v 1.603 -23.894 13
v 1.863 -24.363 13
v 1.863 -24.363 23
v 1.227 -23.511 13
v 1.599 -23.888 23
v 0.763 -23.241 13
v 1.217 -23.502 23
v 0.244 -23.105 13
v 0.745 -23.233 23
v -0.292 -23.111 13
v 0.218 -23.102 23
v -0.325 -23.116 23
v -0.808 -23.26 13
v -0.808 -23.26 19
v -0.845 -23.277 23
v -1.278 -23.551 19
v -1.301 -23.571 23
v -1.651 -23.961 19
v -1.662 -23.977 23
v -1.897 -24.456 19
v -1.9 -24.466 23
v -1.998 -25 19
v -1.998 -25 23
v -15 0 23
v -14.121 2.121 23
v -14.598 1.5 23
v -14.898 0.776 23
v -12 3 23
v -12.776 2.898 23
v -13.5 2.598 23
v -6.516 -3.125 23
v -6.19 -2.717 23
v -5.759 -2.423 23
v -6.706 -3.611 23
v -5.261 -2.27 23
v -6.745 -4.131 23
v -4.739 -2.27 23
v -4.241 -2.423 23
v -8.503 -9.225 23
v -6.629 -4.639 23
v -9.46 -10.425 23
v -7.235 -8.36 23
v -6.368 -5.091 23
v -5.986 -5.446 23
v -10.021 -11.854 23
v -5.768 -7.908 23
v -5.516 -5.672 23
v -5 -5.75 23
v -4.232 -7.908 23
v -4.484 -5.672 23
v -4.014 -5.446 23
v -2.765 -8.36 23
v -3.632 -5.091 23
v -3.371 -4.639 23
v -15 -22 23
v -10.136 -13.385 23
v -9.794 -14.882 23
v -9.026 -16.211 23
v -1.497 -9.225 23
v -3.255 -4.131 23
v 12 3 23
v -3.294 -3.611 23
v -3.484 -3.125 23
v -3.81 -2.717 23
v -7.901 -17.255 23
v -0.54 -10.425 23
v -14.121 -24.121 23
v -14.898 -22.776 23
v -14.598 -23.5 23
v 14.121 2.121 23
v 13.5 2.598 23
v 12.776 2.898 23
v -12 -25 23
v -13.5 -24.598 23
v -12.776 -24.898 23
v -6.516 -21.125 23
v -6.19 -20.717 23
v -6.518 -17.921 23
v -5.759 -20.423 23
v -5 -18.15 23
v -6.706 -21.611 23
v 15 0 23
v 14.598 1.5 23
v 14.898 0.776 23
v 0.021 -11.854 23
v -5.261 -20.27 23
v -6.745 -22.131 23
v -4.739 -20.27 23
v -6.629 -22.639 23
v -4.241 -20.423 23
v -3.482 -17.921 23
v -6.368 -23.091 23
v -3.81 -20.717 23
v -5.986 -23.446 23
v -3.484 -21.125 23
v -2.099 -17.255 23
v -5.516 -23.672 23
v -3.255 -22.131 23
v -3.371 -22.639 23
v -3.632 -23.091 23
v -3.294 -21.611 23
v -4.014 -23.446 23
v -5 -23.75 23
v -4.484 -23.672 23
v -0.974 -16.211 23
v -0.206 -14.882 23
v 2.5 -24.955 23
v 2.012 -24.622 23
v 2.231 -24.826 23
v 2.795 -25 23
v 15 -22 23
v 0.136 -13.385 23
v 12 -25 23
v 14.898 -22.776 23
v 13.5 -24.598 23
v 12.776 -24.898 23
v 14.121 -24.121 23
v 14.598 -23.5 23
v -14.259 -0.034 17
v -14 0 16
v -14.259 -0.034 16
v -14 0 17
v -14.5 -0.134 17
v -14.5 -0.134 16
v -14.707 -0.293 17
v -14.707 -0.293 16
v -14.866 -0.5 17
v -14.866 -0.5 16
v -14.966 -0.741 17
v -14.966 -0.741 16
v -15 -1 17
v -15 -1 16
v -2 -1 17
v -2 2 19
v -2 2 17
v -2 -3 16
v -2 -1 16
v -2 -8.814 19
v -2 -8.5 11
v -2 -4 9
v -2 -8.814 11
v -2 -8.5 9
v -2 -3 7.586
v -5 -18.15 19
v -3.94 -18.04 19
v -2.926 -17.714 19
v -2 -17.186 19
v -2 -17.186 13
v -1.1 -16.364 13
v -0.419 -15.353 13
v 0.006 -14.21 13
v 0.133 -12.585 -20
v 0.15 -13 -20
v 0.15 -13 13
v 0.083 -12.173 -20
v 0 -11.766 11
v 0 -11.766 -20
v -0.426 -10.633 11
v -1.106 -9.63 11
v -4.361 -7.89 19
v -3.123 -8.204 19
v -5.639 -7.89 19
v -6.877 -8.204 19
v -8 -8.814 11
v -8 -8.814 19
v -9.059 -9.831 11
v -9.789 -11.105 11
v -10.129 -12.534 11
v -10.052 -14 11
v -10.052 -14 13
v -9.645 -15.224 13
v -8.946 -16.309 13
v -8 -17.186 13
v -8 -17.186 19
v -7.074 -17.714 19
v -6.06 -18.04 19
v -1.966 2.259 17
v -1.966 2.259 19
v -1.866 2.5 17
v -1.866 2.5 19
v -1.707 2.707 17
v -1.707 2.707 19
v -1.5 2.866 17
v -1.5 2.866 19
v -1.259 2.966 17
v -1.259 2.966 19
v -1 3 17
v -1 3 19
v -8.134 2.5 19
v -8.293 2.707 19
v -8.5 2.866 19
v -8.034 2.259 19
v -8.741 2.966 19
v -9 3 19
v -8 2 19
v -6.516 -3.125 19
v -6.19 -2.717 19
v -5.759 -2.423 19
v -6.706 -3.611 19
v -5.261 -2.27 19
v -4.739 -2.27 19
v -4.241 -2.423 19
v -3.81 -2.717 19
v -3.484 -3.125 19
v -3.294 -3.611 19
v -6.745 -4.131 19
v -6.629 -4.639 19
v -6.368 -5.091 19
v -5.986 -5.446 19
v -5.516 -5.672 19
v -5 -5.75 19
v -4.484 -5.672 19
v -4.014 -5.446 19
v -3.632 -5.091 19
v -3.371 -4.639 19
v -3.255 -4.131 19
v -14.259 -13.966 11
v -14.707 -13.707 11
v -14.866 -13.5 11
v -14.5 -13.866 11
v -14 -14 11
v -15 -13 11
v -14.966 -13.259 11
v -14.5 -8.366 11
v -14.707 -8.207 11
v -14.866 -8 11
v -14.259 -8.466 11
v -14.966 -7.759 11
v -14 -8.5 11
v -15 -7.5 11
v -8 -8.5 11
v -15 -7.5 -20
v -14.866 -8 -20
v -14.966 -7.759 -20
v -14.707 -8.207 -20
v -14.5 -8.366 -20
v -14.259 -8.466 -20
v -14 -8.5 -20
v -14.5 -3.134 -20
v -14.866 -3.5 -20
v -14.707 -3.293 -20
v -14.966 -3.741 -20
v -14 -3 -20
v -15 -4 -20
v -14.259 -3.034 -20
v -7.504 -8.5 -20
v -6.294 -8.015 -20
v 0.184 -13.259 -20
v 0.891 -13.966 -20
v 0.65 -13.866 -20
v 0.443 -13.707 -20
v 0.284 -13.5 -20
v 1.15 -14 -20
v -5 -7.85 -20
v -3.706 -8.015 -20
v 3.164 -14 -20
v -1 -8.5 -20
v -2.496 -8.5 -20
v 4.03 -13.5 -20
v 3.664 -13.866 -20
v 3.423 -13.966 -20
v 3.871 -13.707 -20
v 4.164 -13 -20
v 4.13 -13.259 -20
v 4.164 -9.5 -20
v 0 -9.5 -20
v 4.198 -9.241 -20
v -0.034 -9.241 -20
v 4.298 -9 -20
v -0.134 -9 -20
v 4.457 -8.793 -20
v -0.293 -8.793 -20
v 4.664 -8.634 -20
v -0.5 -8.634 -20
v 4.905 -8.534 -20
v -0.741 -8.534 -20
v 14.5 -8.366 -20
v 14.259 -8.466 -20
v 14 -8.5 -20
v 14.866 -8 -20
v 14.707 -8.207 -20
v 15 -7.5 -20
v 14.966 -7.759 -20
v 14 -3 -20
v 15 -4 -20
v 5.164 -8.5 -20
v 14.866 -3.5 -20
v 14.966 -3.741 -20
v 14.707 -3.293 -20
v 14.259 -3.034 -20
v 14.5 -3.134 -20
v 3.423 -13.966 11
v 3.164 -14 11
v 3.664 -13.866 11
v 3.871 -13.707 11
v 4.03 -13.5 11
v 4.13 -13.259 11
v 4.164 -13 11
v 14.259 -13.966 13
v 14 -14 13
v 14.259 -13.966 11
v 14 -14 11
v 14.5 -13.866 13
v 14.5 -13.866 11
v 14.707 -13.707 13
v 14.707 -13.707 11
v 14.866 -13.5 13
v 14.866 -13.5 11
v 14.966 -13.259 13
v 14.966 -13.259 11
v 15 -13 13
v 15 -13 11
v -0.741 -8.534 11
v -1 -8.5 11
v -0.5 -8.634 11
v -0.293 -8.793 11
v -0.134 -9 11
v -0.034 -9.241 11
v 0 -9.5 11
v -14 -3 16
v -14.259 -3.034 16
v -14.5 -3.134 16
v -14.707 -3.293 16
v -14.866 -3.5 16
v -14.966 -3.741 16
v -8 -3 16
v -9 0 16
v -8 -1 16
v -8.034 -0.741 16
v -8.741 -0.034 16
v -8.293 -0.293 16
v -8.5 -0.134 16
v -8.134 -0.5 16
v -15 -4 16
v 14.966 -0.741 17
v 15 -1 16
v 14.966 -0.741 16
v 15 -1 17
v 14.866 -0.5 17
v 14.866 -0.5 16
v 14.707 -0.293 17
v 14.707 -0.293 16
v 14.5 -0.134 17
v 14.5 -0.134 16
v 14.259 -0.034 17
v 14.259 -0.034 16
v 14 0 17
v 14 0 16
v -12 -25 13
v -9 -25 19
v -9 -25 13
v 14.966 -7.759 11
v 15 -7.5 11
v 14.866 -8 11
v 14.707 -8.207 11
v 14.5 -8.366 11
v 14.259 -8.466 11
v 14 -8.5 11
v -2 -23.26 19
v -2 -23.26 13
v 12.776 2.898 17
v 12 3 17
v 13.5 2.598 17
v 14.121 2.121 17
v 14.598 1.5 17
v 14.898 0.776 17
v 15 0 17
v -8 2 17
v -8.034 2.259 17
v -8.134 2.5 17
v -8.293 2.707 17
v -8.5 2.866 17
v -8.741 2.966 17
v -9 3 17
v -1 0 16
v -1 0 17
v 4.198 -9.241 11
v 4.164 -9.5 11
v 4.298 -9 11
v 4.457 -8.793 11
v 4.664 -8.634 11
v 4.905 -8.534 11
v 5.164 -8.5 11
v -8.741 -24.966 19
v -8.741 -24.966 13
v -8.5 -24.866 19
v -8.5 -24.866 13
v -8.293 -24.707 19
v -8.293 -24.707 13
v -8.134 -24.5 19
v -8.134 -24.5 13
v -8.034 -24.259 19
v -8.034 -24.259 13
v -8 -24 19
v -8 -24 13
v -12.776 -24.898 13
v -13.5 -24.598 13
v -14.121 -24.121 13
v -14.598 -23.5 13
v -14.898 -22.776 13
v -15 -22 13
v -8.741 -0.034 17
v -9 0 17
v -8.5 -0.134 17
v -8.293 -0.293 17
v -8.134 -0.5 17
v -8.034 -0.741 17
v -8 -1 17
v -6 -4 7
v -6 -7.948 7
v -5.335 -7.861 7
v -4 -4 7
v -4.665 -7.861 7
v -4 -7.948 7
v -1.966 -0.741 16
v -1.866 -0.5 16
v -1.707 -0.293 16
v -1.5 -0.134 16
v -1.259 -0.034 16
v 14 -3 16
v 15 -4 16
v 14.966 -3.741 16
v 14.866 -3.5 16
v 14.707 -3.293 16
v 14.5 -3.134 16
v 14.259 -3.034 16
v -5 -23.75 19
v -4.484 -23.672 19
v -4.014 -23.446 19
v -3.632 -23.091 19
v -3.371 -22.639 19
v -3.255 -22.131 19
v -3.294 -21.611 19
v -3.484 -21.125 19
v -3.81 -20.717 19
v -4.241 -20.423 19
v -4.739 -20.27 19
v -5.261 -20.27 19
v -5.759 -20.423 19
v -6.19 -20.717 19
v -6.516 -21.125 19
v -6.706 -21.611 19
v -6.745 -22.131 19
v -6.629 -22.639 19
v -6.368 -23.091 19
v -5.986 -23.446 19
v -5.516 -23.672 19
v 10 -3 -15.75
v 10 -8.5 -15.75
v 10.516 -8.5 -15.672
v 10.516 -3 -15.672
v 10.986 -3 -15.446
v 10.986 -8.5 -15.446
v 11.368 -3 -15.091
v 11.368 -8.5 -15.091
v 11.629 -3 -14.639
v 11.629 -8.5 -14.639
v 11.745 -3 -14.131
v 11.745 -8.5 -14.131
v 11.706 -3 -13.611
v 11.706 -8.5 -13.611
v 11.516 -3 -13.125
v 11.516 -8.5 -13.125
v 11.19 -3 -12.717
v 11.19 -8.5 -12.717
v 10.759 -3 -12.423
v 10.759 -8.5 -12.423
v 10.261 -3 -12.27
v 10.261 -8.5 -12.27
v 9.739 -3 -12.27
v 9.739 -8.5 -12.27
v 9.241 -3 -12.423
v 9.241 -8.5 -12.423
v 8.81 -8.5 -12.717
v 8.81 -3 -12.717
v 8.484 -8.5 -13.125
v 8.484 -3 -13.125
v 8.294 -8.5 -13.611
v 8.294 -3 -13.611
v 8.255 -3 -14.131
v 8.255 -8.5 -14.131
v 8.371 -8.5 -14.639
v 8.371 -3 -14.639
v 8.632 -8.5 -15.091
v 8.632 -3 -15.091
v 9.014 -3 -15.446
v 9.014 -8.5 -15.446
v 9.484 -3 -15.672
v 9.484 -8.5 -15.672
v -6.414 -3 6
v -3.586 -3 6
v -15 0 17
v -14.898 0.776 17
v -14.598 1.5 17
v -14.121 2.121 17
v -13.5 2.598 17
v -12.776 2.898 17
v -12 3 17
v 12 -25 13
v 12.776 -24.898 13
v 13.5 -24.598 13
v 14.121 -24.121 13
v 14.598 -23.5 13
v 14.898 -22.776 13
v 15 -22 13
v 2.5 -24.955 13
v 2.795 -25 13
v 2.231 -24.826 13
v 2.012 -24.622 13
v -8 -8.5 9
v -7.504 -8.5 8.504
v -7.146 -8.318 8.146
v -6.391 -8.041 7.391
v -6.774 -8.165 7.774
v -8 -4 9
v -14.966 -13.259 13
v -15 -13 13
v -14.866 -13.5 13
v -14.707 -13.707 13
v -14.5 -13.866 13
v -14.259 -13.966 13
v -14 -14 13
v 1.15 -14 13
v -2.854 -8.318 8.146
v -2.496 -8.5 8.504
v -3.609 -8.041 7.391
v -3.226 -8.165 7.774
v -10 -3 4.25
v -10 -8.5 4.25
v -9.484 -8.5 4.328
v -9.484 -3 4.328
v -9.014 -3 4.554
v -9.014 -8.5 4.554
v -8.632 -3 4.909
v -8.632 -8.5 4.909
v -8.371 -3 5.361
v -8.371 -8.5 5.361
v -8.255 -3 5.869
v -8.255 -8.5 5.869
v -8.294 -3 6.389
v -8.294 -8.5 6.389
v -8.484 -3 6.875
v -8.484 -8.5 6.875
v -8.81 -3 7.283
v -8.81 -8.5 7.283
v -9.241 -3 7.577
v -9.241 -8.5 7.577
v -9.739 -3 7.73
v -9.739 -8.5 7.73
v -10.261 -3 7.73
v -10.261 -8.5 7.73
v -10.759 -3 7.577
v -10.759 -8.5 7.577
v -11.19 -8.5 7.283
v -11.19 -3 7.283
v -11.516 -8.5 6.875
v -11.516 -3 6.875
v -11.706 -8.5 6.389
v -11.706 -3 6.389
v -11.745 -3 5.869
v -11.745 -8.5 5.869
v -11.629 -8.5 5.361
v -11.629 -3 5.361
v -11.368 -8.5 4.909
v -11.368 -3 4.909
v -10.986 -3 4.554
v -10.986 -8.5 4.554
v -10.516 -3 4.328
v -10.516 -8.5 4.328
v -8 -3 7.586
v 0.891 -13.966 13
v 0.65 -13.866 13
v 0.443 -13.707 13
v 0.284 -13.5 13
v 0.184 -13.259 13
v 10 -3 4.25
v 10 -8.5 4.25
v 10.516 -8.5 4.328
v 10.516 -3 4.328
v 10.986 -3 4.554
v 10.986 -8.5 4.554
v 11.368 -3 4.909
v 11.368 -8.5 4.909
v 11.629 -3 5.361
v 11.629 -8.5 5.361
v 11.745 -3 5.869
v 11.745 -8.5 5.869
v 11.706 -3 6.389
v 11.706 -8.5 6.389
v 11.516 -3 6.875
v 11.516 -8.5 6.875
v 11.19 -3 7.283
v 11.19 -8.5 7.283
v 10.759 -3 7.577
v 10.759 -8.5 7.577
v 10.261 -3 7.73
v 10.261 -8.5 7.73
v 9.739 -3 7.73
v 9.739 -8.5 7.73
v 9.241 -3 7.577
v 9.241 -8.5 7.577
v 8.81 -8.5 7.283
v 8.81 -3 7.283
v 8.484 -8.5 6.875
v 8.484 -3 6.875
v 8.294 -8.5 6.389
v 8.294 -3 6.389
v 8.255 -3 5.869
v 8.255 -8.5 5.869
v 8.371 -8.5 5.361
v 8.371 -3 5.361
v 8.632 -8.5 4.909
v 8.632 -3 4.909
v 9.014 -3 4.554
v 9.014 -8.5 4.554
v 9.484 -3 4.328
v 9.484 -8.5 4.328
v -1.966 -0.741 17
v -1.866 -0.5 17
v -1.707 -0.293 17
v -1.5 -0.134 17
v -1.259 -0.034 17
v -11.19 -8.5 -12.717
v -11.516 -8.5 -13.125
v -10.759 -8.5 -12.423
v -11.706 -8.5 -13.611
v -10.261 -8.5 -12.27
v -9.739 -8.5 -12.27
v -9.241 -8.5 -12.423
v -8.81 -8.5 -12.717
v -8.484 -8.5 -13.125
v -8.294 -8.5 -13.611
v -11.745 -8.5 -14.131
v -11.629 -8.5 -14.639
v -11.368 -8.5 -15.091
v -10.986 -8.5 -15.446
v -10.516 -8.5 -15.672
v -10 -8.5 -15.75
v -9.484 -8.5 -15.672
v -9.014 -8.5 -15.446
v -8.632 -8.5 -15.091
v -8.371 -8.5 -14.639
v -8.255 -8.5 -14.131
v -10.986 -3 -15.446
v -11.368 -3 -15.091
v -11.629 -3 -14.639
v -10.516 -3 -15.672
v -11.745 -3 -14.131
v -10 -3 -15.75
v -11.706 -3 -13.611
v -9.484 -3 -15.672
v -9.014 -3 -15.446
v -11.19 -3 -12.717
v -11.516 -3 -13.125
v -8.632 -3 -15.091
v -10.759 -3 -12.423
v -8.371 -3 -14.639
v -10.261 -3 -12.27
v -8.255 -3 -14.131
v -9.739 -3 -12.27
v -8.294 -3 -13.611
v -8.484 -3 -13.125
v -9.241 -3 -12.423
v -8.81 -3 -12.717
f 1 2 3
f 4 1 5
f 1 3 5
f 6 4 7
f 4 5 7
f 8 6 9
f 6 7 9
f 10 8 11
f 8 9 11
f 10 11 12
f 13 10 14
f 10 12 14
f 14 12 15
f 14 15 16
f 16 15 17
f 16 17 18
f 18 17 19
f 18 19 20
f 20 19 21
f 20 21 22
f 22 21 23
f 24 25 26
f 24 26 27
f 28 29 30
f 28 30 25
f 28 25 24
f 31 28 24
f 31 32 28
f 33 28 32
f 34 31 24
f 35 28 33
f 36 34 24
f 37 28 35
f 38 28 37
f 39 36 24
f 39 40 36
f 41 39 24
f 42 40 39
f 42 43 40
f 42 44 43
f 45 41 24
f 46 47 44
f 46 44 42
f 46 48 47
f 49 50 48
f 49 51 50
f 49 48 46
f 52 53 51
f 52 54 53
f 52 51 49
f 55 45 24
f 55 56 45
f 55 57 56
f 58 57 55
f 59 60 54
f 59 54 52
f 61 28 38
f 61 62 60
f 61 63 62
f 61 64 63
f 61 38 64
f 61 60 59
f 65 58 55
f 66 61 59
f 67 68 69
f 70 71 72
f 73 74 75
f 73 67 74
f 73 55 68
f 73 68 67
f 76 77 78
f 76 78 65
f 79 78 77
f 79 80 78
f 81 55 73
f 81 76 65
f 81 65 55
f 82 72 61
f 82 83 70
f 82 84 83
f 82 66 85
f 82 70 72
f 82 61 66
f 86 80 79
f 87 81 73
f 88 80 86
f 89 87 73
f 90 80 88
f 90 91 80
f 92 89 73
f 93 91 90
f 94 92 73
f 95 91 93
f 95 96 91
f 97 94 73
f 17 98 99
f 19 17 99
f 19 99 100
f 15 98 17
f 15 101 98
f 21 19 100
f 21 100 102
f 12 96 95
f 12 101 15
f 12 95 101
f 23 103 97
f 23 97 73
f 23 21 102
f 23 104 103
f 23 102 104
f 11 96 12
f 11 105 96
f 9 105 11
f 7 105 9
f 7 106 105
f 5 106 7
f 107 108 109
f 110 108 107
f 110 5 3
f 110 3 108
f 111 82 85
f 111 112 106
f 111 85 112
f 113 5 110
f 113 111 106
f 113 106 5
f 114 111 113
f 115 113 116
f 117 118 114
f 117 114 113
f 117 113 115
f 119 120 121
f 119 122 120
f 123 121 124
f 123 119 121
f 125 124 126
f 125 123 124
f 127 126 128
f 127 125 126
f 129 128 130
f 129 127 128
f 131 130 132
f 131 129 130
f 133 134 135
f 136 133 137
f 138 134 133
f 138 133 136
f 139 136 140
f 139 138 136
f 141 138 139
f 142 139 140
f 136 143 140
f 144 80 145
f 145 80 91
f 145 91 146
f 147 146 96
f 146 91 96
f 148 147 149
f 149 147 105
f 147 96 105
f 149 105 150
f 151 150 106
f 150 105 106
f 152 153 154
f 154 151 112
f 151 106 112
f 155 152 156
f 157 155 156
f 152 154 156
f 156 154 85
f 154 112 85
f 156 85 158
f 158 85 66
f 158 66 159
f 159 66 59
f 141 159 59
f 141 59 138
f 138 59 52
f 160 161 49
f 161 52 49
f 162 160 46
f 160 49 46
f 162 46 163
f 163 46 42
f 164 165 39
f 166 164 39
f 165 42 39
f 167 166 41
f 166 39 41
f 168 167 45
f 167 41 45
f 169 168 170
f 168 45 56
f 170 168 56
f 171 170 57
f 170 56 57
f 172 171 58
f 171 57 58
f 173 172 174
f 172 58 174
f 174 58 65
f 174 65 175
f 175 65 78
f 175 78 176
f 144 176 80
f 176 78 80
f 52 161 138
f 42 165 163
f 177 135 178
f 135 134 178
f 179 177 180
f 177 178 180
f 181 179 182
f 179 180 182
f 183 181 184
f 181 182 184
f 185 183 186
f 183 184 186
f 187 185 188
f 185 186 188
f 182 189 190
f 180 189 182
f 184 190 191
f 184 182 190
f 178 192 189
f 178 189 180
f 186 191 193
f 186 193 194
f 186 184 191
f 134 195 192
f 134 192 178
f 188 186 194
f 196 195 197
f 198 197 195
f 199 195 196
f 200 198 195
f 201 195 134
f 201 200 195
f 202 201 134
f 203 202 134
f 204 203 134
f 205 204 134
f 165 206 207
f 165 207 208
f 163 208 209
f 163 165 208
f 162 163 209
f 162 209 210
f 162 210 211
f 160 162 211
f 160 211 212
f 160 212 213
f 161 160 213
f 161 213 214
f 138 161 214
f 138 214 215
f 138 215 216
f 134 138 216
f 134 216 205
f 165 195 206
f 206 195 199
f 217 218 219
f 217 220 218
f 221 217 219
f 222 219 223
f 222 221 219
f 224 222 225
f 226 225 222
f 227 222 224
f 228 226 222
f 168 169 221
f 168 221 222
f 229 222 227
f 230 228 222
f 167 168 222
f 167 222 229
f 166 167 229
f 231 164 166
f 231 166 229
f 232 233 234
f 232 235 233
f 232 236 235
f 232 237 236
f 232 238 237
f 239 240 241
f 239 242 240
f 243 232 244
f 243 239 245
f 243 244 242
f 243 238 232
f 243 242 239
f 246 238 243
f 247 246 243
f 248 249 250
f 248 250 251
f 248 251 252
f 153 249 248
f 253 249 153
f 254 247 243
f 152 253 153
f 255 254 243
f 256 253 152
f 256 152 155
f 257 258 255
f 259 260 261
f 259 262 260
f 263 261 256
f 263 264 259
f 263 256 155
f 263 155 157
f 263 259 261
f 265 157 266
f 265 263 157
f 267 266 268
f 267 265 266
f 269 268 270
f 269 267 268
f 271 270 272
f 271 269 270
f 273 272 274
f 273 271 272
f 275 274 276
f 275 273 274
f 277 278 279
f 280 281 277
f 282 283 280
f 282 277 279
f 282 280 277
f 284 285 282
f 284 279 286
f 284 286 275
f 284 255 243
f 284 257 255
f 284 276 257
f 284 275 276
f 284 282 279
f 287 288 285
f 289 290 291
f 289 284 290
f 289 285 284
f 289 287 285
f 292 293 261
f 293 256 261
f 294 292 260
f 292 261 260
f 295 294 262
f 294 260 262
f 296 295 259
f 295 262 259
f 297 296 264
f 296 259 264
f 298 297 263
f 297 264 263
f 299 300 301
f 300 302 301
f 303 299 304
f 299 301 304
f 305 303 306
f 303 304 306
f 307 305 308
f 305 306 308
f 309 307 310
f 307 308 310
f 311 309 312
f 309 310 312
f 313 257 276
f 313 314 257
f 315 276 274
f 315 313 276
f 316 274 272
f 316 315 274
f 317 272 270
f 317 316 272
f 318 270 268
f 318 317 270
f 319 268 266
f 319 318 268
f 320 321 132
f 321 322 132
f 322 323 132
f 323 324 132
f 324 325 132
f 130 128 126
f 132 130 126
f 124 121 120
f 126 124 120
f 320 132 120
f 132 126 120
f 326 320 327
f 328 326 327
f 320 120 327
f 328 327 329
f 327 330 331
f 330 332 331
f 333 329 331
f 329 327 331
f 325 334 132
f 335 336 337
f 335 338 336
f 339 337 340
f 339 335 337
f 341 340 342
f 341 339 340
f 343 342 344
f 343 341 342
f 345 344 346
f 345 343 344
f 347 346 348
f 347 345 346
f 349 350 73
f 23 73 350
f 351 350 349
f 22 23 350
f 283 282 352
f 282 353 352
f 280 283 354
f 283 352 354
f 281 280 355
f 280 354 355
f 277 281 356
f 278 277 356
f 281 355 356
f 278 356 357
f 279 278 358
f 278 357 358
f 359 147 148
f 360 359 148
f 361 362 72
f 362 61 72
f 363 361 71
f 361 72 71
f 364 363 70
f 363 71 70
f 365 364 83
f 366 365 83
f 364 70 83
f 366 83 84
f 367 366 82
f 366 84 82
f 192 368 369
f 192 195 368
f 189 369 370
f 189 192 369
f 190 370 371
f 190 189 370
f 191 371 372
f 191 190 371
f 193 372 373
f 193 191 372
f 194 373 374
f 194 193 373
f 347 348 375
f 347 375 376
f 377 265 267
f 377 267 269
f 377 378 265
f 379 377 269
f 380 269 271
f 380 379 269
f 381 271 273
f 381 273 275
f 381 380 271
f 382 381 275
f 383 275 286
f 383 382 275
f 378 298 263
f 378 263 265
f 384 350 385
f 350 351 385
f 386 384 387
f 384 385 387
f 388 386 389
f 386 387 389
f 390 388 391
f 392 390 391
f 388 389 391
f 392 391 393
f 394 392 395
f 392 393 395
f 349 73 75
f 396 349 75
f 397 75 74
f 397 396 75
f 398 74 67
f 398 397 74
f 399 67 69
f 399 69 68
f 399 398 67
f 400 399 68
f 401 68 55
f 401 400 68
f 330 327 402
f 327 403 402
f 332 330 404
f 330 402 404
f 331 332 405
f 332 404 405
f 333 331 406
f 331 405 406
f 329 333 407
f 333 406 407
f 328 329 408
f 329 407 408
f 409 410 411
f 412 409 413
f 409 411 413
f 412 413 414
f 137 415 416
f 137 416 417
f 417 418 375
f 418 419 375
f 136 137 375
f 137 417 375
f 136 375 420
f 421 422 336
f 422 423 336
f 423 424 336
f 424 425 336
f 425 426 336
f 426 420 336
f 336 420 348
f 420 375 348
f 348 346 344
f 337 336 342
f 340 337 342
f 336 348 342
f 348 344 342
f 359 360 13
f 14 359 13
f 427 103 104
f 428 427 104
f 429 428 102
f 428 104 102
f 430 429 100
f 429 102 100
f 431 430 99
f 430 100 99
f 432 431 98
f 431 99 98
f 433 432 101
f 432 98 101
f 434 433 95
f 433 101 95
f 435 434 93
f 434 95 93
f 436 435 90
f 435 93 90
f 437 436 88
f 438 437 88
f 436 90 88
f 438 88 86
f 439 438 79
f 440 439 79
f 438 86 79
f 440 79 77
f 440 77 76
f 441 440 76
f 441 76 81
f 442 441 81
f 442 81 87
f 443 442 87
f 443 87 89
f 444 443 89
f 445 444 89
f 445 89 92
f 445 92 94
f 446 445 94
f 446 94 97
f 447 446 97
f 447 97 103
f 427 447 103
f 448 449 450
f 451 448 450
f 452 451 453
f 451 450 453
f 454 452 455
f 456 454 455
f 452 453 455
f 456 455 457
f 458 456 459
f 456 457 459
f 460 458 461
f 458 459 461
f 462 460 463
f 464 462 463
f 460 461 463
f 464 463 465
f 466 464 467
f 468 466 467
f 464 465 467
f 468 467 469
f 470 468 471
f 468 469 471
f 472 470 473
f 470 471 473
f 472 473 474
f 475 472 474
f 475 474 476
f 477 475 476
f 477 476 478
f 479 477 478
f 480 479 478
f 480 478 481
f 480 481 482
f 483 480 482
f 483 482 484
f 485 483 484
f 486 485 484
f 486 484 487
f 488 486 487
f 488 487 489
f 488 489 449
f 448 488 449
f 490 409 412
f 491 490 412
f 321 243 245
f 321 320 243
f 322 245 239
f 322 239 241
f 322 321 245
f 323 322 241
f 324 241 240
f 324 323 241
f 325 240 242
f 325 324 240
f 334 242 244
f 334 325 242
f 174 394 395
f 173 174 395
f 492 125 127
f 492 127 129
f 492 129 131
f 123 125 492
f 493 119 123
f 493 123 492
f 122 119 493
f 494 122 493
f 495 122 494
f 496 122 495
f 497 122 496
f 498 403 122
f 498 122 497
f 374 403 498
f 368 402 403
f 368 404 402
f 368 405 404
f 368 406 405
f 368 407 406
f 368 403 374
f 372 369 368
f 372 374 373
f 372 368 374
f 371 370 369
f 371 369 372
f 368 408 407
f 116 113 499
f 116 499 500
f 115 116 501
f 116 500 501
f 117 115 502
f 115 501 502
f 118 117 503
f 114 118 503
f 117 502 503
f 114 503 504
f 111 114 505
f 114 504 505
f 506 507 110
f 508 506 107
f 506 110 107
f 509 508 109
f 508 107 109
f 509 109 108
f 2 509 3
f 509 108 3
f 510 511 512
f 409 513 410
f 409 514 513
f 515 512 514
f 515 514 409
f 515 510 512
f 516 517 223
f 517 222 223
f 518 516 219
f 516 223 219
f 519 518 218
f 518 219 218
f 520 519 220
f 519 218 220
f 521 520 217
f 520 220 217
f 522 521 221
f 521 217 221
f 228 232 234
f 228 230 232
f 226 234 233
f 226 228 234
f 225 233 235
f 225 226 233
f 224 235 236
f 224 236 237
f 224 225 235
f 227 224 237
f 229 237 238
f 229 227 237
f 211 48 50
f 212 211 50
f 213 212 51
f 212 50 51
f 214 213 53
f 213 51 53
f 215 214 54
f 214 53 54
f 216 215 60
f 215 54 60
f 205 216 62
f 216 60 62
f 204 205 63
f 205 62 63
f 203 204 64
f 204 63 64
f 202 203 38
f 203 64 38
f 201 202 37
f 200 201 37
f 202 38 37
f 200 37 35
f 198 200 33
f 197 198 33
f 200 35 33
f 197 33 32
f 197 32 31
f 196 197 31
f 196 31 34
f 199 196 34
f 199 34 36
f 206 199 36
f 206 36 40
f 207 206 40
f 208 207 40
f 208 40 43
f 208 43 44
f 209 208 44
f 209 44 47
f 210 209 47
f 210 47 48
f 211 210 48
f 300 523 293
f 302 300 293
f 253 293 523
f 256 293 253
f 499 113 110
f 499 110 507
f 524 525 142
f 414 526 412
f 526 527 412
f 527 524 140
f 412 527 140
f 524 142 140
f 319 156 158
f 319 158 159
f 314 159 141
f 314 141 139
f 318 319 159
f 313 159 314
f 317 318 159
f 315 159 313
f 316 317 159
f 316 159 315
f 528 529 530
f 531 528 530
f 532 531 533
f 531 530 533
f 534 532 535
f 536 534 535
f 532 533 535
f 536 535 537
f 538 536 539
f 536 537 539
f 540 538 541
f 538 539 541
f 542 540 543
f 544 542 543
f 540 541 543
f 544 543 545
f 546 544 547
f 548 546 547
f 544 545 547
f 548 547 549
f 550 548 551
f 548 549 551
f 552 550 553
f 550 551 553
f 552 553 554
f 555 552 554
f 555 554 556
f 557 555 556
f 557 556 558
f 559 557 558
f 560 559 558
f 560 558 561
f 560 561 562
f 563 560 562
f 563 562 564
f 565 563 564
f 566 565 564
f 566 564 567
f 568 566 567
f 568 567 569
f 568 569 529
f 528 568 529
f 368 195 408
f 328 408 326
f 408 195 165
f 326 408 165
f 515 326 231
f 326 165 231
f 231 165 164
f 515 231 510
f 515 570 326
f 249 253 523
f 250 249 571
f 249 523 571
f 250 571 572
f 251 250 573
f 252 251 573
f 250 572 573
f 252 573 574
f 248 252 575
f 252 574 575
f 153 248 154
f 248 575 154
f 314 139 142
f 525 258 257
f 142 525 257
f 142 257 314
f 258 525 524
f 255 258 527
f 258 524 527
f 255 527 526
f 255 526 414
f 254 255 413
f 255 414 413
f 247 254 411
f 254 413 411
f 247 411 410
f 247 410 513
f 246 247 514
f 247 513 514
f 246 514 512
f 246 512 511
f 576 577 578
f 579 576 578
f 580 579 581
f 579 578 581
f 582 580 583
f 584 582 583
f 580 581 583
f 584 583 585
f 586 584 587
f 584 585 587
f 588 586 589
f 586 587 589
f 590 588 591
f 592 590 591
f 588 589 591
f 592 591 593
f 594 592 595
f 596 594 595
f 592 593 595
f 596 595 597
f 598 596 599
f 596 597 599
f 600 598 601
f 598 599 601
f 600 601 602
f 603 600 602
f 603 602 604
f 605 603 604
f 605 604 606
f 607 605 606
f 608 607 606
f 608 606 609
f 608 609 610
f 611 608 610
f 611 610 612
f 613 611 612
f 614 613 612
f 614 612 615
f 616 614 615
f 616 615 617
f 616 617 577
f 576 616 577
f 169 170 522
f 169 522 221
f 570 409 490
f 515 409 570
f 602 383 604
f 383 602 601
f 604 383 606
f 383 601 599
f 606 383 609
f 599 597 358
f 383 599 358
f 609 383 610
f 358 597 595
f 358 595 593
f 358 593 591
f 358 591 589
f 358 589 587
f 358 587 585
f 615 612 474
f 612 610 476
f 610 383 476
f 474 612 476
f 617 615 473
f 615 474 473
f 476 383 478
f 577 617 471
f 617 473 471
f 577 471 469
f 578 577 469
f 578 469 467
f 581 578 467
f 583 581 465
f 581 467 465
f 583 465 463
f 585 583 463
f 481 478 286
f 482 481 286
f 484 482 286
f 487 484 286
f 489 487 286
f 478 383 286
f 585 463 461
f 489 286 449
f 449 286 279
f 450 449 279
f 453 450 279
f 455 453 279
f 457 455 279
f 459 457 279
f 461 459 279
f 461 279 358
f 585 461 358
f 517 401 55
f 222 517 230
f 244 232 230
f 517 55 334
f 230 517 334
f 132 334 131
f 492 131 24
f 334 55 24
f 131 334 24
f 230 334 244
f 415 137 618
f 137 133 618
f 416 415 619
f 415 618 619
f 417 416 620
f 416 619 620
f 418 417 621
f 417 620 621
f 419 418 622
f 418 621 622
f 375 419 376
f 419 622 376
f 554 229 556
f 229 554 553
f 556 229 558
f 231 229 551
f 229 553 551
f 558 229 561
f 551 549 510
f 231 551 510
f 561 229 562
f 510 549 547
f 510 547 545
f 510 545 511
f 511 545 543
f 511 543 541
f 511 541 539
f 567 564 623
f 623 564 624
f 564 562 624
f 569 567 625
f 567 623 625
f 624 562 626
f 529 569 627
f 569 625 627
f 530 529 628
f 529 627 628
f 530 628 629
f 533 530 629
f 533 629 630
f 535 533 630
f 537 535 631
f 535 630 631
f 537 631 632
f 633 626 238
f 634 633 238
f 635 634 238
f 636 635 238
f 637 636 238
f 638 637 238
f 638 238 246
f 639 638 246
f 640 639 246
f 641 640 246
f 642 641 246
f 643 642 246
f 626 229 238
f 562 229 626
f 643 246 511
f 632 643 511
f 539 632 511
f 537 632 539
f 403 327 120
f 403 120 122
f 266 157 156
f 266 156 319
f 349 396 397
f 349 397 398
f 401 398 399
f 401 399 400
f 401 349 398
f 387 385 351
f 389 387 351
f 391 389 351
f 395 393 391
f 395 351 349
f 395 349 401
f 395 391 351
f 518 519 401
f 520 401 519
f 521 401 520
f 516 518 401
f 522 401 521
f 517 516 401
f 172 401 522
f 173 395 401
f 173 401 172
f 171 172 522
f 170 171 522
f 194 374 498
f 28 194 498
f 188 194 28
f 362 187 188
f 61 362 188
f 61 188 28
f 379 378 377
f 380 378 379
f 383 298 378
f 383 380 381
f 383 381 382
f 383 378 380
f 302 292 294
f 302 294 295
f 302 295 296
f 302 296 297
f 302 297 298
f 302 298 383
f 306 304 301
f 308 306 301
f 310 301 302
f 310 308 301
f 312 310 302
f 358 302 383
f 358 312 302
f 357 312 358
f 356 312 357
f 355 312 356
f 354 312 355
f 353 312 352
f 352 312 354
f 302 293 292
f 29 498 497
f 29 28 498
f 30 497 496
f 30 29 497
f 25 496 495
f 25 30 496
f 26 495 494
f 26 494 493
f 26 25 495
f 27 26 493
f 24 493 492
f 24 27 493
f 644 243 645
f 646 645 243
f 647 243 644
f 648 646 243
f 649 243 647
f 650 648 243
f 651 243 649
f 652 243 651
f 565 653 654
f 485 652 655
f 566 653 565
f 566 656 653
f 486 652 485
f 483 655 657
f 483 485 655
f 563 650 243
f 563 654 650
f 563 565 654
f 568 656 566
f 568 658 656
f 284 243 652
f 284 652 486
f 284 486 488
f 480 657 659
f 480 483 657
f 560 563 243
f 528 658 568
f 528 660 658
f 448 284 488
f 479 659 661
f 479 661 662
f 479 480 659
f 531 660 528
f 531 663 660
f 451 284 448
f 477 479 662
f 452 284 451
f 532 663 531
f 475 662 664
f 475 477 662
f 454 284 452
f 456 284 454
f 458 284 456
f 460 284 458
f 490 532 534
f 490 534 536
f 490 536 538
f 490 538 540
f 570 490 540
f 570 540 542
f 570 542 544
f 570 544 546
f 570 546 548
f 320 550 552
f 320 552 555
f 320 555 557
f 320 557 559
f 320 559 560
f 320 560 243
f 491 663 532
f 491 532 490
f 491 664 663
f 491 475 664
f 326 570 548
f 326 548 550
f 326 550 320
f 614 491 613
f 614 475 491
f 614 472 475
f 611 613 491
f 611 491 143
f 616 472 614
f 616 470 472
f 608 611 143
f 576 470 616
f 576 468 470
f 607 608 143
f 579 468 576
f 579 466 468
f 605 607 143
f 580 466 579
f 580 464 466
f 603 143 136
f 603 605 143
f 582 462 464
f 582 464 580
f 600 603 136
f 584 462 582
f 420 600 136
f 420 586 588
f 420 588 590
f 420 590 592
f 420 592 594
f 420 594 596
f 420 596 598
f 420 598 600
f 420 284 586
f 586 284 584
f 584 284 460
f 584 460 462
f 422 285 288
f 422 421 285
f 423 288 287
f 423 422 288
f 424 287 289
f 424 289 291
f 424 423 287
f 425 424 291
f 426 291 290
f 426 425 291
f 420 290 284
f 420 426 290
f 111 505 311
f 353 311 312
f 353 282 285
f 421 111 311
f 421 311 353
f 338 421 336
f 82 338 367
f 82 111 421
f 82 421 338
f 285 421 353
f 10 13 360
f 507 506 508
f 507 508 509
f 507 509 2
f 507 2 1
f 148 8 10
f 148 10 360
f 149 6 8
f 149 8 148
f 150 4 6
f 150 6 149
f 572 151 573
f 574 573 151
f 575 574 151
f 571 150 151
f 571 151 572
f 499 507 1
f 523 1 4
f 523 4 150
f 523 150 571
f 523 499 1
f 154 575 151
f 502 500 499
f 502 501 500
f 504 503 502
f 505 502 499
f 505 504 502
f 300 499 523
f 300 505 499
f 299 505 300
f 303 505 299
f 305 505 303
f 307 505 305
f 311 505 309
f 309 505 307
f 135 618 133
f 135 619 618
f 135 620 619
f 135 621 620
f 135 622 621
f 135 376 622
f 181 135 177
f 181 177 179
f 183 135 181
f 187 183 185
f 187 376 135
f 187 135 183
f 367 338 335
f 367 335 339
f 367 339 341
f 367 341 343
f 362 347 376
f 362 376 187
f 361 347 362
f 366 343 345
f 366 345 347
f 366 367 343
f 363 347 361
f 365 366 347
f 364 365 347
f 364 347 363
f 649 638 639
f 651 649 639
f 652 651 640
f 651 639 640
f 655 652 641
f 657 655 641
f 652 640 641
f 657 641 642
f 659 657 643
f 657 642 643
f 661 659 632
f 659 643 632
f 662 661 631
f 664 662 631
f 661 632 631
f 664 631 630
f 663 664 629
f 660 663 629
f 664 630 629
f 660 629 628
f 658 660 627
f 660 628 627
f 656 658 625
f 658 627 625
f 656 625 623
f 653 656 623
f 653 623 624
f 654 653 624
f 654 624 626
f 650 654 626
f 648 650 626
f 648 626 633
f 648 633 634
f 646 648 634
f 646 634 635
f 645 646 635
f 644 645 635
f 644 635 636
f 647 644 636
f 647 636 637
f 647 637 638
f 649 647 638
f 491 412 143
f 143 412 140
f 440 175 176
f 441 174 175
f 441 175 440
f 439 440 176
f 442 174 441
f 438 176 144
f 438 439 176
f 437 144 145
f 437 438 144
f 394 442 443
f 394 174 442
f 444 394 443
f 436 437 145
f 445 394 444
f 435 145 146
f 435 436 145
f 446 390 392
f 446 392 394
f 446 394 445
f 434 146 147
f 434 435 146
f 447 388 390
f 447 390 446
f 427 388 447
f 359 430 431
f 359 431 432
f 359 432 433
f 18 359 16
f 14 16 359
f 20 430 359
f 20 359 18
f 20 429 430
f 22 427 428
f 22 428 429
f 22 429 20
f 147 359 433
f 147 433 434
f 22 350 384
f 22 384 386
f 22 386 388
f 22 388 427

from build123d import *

# Parameters (mm, degrees)
PAD001_DEPTH      = 15
PAD001_DEPTH_BACK = 15
SKETCH014_W       = 12
SKETCH014_H       = 6
POCKET_DEPTH      = 28.001
SKETCH013_R       = 1.75
POCKET001_DEPTH   = 21
SKETCH012_R       = 5.15
POCKET002_DEPTH   = 43.001
SKETCH007_R       = 1.75
POCKET003_DEPTH   = 17.001
SKETCH008_W       = 6.407674
SKETCH008_H       = 16
SKETCH008_W_2     = 6.93002
SKETCH008_H_2     = 13.41794
POCKET004_DEPTH   = 31
SKETCH018_R       = 2
POCKET005_DEPTH   = 55.001
SKETCH020_W       = 2.261289
SKETCH020_H       = 2.342064
POCKET006_DEPTH   = 6
SKETCH015_W       = 50.47
SKETCH015_H       = 40
POCKET007_DEPTH   = 3
CHAMFER_SIZE      = 2
CHAMFER001_SIZE   = 2
CHAMFER002_SIZE   = 1
FILLET_R          = 3
FILLET001_R       = 1
FILLET002_R       = 1
FILLET003_R       = 1
FILLET004_R       = 1
FILLET005_R       = 1
FILLET006_R       = 1
FILLET007_R       = 1
FILLET008_R       = 1
FILLET009_R       = 1
FILLET010_R       = 1
FILLET011_R       = 1
FILLET012_R       = 1
FILLET013_R       = 1


with BuildPart() as part:
    # Sketch005 → Pad001 (new body, two sides)
    with BuildSketch(Plane.YZ) as pad001_sk:
        Polygon((0, -20), (0, 17), (3, 17), (3, 23), (-25, 23), (-25, 13), (-14, 13), (-14, -20), align=None)
    extrude(amount=PAD001_DEPTH)
    extrude(pad001_sk.sketch, amount=-PAD001_DEPTH_BACK)

    # Sketch014 (on Face5 of Pad001) → Pocket (cut, through all)
    with BuildSketch(Plane(origin=(0, -25, 0), x_dir=(0, 0, -1), z_dir=(0, -1, 0))):
        with Locations((-13, -5)):
            Rectangle(SKETCH014_W, SKETCH014_H)
    extrude(amount=-POCKET_DEPTH, mode=Mode.SUBTRACT)

    # Sketch013 → Pocket001 (cut)
    with BuildSketch(Plane(origin=(0, 0, 35), x_dir=(0, -1, 0), z_dir=(0, 0, 1))):
        with Locations((4, -5)):
            Circle(SKETCH013_R)
        with Locations((22, -5)):
            Circle(SKETCH013_R)
    extrude(amount=-POCKET001_DEPTH, mode=Mode.SUBTRACT)

    # Sketch012 (on Face4 of Pad001) → Pocket002 (cut, through all)
    with BuildSketch(Plane(origin=(0, 0, 23), x_dir=(0, -1, 0), z_dir=(0, 0, 1))):
        with Locations((13, -5)):
            Circle(SKETCH012_R)
    extrude(amount=-POCKET002_DEPTH, mode=Mode.SUBTRACT)

    # Sketch007 → Pocket003 (cut, through all)
    with BuildSketch(Plane(origin=(0, -14, 0), x_dir=(0, 0, -1), z_dir=(0, -1, 0))):
        with Locations((-6, 10)):
            Circle(SKETCH007_R)
        with Locations((14, 10)):
            Circle(SKETCH007_R)
        with Locations((-6, -10)):
            Circle(SKETCH007_R)
        with Locations((14, -10)):
            Circle(SKETCH007_R)
    extrude(amount=-POCKET003_DEPTH, mode=Mode.SUBTRACT)

    # Sketch008 → Pocket004 (cut)
    with BuildSketch(Plane.YX.offset(20)):
        with Locations((-11.703837, -8)):
            Rectangle(SKETCH008_W, SKETCH008_H)
        with Locations((-11.96501, 10.872729)):
            Rectangle(SKETCH008_W_2, SKETCH008_H_2)
    extrude(amount=-POCKET004_DEPTH, mode=Mode.SUBTRACT)

    # Sketch018 → Pocket005 (cut, through all)
    with BuildSketch(Plane(origin=(0, 0, 35), x_dir=(0, -1, 0), z_dir=(0, 0, 1))):
        with Locations((25.089622, 0)):
            Circle(SKETCH018_R)
    extrude(amount=-POCKET005_DEPTH, mode=Mode.SUBTRACT)

    # Sketch020 (on Face29 of Pocket005) → Pocket006 (cut)
    with BuildSketch(Plane.YX.offset(-13)):
        with Locations((-24.390742, -1.171032)):
            Rectangle(SKETCH020_W, SKETCH020_H)
    extrude(amount=-POCKET006_DEPTH, mode=Mode.SUBTRACT)

    # Sketch015 → Pocket007 (cut)
    with BuildSketch(Plane.ZX):
        with Locations((-9.235, 0)):
            Rectangle(SKETCH015_W, SKETCH015_H)
    extrude(amount=-POCKET007_DEPTH, mode=Mode.SUBTRACT)

    # Chamfer
    chamfer_edges = [part.edges().sort_by_distance(p)[0] for p in [
        (-8, -5.75, 7),
    ]]
    chamfer(chamfer_edges, length=CHAMFER_SIZE)

    # Chamfer001
    chamfer001_edges = [part.edges().sort_by_distance(p)[0] for p in [
        (-2, -5.75, 7),
    ]]
    chamfer(chamfer001_edges, length=CHAMFER001_SIZE)

    # Chamfer002
    chamfer002_edges = [part.edges().sort_by_distance(p)[0] for p in [
        (-3, -3, 8),
        (-5, -3, 7),
        (-7, -3, 8),
    ]]
    chamfer(chamfer002_edges, length=CHAMFER002_SIZE)

    # Fillet
    fillet_edges = [part.edges().sort_by_distance(p)[0] for p in [
        (-15, -25, 18),
        (15, -25, 18),
        (-15, 3, 20),
        (15, 3, 20),
    ]]
    fillet(fillet_edges, radius=FILLET_R)

    # Fillet001
    fillet001_edges = [part.edges().sort_by_distance(p)[0] for p in [
        (-15, -8.5, -4.5),
        (4.163759, -14, -4.5),
    ]]
    fillet(fillet001_edges, radius=FILLET001_R)

    # Fillet002
    fillet002_edges = [part.edges().sort_by_distance(p)[0] for p in [
        (0.05198, -14, -3.5),
    ]]
    fillet(fillet002_edges, radius=FILLET002_R)

    # Fillet003
    fillet003_edges = [part.edges().sort_by_distance(p)[0] for p in [
        (15, -14, 12),
        (15, -8.5, -4.5),
    ]]
    fillet(fillet003_edges, radius=FILLET003_R)

    # Fillet004
    fillet004_edges = [part.edges().sort_by_distance(p)[0] for p in [
        (-8, -25, 16),
    ]]
    fillet(fillet004_edges, radius=FILLET004_R)

    # Fillet005
    fillet005_edges = [part.edges().sort_by_distance(p)[0] for p in [
        (-15, -14, 12),
    ]]
    fillet(fillet005_edges, radius=FILLET005_R)

    # Fillet006
    fillet006_edges = [part.edges().sort_by_distance(p)[0] for p in [
        (0, -8.5, -4.5),
    ]]
    fillet(fillet006_edges, radius=FILLET006_R)

    # Fillet007
    fillet007_edges = [part.edges().sort_by_distance(p)[0] for p in [
        (4.163759, -8.5, -4.5),
    ]]
    fillet(fillet007_edges, radius=FILLET007_R)

    # Fillet008
    fillet008_edges = [part.edges().sort_by_distance(p)[0] for p in [
        (-15, -3, -2),
        (15, -3, -2),
    ]]
    fillet(fillet008_edges, radius=FILLET008_R)

    # Fillet009
    fillet009_edges = [part.edges().sort_by_distance(p)[0] for p in [
        (-8, 3, 18),
        (-2, 3, 18),
    ]]
    fillet(fillet009_edges, radius=FILLET009_R)

    # Fillet010
    fillet010_edges = [part.edges().sort_by_distance(p)[0] for p in [
        (-2, 0, 16.5),
        (-8, 0, 16.5),
    ]]
    fillet(fillet010_edges, radius=FILLET010_R)

    # Fillet011
    fillet011_edges = [part.edges().sort_by_distance(p)[0] for p in [
        (-15, 0, 16.5),
    ]]
    fillet(fillet011_edges, radius=FILLET011_R)

    # Fillet012
    fillet012_edges = [part.edges().sort_by_distance(p)[0] for p in [
        (15, 0, 16.5),
    ]]
    fillet(fillet012_edges, radius=FILLET012_R)

    # Fillet013
    fillet013_edges = [part.edges().sort_by_distance(p)[0] for p in [
        (1.997991, -25, 18),
    ]]
    fillet(fillet013_edges, radius=FILLET013_R)


solid = part.part
